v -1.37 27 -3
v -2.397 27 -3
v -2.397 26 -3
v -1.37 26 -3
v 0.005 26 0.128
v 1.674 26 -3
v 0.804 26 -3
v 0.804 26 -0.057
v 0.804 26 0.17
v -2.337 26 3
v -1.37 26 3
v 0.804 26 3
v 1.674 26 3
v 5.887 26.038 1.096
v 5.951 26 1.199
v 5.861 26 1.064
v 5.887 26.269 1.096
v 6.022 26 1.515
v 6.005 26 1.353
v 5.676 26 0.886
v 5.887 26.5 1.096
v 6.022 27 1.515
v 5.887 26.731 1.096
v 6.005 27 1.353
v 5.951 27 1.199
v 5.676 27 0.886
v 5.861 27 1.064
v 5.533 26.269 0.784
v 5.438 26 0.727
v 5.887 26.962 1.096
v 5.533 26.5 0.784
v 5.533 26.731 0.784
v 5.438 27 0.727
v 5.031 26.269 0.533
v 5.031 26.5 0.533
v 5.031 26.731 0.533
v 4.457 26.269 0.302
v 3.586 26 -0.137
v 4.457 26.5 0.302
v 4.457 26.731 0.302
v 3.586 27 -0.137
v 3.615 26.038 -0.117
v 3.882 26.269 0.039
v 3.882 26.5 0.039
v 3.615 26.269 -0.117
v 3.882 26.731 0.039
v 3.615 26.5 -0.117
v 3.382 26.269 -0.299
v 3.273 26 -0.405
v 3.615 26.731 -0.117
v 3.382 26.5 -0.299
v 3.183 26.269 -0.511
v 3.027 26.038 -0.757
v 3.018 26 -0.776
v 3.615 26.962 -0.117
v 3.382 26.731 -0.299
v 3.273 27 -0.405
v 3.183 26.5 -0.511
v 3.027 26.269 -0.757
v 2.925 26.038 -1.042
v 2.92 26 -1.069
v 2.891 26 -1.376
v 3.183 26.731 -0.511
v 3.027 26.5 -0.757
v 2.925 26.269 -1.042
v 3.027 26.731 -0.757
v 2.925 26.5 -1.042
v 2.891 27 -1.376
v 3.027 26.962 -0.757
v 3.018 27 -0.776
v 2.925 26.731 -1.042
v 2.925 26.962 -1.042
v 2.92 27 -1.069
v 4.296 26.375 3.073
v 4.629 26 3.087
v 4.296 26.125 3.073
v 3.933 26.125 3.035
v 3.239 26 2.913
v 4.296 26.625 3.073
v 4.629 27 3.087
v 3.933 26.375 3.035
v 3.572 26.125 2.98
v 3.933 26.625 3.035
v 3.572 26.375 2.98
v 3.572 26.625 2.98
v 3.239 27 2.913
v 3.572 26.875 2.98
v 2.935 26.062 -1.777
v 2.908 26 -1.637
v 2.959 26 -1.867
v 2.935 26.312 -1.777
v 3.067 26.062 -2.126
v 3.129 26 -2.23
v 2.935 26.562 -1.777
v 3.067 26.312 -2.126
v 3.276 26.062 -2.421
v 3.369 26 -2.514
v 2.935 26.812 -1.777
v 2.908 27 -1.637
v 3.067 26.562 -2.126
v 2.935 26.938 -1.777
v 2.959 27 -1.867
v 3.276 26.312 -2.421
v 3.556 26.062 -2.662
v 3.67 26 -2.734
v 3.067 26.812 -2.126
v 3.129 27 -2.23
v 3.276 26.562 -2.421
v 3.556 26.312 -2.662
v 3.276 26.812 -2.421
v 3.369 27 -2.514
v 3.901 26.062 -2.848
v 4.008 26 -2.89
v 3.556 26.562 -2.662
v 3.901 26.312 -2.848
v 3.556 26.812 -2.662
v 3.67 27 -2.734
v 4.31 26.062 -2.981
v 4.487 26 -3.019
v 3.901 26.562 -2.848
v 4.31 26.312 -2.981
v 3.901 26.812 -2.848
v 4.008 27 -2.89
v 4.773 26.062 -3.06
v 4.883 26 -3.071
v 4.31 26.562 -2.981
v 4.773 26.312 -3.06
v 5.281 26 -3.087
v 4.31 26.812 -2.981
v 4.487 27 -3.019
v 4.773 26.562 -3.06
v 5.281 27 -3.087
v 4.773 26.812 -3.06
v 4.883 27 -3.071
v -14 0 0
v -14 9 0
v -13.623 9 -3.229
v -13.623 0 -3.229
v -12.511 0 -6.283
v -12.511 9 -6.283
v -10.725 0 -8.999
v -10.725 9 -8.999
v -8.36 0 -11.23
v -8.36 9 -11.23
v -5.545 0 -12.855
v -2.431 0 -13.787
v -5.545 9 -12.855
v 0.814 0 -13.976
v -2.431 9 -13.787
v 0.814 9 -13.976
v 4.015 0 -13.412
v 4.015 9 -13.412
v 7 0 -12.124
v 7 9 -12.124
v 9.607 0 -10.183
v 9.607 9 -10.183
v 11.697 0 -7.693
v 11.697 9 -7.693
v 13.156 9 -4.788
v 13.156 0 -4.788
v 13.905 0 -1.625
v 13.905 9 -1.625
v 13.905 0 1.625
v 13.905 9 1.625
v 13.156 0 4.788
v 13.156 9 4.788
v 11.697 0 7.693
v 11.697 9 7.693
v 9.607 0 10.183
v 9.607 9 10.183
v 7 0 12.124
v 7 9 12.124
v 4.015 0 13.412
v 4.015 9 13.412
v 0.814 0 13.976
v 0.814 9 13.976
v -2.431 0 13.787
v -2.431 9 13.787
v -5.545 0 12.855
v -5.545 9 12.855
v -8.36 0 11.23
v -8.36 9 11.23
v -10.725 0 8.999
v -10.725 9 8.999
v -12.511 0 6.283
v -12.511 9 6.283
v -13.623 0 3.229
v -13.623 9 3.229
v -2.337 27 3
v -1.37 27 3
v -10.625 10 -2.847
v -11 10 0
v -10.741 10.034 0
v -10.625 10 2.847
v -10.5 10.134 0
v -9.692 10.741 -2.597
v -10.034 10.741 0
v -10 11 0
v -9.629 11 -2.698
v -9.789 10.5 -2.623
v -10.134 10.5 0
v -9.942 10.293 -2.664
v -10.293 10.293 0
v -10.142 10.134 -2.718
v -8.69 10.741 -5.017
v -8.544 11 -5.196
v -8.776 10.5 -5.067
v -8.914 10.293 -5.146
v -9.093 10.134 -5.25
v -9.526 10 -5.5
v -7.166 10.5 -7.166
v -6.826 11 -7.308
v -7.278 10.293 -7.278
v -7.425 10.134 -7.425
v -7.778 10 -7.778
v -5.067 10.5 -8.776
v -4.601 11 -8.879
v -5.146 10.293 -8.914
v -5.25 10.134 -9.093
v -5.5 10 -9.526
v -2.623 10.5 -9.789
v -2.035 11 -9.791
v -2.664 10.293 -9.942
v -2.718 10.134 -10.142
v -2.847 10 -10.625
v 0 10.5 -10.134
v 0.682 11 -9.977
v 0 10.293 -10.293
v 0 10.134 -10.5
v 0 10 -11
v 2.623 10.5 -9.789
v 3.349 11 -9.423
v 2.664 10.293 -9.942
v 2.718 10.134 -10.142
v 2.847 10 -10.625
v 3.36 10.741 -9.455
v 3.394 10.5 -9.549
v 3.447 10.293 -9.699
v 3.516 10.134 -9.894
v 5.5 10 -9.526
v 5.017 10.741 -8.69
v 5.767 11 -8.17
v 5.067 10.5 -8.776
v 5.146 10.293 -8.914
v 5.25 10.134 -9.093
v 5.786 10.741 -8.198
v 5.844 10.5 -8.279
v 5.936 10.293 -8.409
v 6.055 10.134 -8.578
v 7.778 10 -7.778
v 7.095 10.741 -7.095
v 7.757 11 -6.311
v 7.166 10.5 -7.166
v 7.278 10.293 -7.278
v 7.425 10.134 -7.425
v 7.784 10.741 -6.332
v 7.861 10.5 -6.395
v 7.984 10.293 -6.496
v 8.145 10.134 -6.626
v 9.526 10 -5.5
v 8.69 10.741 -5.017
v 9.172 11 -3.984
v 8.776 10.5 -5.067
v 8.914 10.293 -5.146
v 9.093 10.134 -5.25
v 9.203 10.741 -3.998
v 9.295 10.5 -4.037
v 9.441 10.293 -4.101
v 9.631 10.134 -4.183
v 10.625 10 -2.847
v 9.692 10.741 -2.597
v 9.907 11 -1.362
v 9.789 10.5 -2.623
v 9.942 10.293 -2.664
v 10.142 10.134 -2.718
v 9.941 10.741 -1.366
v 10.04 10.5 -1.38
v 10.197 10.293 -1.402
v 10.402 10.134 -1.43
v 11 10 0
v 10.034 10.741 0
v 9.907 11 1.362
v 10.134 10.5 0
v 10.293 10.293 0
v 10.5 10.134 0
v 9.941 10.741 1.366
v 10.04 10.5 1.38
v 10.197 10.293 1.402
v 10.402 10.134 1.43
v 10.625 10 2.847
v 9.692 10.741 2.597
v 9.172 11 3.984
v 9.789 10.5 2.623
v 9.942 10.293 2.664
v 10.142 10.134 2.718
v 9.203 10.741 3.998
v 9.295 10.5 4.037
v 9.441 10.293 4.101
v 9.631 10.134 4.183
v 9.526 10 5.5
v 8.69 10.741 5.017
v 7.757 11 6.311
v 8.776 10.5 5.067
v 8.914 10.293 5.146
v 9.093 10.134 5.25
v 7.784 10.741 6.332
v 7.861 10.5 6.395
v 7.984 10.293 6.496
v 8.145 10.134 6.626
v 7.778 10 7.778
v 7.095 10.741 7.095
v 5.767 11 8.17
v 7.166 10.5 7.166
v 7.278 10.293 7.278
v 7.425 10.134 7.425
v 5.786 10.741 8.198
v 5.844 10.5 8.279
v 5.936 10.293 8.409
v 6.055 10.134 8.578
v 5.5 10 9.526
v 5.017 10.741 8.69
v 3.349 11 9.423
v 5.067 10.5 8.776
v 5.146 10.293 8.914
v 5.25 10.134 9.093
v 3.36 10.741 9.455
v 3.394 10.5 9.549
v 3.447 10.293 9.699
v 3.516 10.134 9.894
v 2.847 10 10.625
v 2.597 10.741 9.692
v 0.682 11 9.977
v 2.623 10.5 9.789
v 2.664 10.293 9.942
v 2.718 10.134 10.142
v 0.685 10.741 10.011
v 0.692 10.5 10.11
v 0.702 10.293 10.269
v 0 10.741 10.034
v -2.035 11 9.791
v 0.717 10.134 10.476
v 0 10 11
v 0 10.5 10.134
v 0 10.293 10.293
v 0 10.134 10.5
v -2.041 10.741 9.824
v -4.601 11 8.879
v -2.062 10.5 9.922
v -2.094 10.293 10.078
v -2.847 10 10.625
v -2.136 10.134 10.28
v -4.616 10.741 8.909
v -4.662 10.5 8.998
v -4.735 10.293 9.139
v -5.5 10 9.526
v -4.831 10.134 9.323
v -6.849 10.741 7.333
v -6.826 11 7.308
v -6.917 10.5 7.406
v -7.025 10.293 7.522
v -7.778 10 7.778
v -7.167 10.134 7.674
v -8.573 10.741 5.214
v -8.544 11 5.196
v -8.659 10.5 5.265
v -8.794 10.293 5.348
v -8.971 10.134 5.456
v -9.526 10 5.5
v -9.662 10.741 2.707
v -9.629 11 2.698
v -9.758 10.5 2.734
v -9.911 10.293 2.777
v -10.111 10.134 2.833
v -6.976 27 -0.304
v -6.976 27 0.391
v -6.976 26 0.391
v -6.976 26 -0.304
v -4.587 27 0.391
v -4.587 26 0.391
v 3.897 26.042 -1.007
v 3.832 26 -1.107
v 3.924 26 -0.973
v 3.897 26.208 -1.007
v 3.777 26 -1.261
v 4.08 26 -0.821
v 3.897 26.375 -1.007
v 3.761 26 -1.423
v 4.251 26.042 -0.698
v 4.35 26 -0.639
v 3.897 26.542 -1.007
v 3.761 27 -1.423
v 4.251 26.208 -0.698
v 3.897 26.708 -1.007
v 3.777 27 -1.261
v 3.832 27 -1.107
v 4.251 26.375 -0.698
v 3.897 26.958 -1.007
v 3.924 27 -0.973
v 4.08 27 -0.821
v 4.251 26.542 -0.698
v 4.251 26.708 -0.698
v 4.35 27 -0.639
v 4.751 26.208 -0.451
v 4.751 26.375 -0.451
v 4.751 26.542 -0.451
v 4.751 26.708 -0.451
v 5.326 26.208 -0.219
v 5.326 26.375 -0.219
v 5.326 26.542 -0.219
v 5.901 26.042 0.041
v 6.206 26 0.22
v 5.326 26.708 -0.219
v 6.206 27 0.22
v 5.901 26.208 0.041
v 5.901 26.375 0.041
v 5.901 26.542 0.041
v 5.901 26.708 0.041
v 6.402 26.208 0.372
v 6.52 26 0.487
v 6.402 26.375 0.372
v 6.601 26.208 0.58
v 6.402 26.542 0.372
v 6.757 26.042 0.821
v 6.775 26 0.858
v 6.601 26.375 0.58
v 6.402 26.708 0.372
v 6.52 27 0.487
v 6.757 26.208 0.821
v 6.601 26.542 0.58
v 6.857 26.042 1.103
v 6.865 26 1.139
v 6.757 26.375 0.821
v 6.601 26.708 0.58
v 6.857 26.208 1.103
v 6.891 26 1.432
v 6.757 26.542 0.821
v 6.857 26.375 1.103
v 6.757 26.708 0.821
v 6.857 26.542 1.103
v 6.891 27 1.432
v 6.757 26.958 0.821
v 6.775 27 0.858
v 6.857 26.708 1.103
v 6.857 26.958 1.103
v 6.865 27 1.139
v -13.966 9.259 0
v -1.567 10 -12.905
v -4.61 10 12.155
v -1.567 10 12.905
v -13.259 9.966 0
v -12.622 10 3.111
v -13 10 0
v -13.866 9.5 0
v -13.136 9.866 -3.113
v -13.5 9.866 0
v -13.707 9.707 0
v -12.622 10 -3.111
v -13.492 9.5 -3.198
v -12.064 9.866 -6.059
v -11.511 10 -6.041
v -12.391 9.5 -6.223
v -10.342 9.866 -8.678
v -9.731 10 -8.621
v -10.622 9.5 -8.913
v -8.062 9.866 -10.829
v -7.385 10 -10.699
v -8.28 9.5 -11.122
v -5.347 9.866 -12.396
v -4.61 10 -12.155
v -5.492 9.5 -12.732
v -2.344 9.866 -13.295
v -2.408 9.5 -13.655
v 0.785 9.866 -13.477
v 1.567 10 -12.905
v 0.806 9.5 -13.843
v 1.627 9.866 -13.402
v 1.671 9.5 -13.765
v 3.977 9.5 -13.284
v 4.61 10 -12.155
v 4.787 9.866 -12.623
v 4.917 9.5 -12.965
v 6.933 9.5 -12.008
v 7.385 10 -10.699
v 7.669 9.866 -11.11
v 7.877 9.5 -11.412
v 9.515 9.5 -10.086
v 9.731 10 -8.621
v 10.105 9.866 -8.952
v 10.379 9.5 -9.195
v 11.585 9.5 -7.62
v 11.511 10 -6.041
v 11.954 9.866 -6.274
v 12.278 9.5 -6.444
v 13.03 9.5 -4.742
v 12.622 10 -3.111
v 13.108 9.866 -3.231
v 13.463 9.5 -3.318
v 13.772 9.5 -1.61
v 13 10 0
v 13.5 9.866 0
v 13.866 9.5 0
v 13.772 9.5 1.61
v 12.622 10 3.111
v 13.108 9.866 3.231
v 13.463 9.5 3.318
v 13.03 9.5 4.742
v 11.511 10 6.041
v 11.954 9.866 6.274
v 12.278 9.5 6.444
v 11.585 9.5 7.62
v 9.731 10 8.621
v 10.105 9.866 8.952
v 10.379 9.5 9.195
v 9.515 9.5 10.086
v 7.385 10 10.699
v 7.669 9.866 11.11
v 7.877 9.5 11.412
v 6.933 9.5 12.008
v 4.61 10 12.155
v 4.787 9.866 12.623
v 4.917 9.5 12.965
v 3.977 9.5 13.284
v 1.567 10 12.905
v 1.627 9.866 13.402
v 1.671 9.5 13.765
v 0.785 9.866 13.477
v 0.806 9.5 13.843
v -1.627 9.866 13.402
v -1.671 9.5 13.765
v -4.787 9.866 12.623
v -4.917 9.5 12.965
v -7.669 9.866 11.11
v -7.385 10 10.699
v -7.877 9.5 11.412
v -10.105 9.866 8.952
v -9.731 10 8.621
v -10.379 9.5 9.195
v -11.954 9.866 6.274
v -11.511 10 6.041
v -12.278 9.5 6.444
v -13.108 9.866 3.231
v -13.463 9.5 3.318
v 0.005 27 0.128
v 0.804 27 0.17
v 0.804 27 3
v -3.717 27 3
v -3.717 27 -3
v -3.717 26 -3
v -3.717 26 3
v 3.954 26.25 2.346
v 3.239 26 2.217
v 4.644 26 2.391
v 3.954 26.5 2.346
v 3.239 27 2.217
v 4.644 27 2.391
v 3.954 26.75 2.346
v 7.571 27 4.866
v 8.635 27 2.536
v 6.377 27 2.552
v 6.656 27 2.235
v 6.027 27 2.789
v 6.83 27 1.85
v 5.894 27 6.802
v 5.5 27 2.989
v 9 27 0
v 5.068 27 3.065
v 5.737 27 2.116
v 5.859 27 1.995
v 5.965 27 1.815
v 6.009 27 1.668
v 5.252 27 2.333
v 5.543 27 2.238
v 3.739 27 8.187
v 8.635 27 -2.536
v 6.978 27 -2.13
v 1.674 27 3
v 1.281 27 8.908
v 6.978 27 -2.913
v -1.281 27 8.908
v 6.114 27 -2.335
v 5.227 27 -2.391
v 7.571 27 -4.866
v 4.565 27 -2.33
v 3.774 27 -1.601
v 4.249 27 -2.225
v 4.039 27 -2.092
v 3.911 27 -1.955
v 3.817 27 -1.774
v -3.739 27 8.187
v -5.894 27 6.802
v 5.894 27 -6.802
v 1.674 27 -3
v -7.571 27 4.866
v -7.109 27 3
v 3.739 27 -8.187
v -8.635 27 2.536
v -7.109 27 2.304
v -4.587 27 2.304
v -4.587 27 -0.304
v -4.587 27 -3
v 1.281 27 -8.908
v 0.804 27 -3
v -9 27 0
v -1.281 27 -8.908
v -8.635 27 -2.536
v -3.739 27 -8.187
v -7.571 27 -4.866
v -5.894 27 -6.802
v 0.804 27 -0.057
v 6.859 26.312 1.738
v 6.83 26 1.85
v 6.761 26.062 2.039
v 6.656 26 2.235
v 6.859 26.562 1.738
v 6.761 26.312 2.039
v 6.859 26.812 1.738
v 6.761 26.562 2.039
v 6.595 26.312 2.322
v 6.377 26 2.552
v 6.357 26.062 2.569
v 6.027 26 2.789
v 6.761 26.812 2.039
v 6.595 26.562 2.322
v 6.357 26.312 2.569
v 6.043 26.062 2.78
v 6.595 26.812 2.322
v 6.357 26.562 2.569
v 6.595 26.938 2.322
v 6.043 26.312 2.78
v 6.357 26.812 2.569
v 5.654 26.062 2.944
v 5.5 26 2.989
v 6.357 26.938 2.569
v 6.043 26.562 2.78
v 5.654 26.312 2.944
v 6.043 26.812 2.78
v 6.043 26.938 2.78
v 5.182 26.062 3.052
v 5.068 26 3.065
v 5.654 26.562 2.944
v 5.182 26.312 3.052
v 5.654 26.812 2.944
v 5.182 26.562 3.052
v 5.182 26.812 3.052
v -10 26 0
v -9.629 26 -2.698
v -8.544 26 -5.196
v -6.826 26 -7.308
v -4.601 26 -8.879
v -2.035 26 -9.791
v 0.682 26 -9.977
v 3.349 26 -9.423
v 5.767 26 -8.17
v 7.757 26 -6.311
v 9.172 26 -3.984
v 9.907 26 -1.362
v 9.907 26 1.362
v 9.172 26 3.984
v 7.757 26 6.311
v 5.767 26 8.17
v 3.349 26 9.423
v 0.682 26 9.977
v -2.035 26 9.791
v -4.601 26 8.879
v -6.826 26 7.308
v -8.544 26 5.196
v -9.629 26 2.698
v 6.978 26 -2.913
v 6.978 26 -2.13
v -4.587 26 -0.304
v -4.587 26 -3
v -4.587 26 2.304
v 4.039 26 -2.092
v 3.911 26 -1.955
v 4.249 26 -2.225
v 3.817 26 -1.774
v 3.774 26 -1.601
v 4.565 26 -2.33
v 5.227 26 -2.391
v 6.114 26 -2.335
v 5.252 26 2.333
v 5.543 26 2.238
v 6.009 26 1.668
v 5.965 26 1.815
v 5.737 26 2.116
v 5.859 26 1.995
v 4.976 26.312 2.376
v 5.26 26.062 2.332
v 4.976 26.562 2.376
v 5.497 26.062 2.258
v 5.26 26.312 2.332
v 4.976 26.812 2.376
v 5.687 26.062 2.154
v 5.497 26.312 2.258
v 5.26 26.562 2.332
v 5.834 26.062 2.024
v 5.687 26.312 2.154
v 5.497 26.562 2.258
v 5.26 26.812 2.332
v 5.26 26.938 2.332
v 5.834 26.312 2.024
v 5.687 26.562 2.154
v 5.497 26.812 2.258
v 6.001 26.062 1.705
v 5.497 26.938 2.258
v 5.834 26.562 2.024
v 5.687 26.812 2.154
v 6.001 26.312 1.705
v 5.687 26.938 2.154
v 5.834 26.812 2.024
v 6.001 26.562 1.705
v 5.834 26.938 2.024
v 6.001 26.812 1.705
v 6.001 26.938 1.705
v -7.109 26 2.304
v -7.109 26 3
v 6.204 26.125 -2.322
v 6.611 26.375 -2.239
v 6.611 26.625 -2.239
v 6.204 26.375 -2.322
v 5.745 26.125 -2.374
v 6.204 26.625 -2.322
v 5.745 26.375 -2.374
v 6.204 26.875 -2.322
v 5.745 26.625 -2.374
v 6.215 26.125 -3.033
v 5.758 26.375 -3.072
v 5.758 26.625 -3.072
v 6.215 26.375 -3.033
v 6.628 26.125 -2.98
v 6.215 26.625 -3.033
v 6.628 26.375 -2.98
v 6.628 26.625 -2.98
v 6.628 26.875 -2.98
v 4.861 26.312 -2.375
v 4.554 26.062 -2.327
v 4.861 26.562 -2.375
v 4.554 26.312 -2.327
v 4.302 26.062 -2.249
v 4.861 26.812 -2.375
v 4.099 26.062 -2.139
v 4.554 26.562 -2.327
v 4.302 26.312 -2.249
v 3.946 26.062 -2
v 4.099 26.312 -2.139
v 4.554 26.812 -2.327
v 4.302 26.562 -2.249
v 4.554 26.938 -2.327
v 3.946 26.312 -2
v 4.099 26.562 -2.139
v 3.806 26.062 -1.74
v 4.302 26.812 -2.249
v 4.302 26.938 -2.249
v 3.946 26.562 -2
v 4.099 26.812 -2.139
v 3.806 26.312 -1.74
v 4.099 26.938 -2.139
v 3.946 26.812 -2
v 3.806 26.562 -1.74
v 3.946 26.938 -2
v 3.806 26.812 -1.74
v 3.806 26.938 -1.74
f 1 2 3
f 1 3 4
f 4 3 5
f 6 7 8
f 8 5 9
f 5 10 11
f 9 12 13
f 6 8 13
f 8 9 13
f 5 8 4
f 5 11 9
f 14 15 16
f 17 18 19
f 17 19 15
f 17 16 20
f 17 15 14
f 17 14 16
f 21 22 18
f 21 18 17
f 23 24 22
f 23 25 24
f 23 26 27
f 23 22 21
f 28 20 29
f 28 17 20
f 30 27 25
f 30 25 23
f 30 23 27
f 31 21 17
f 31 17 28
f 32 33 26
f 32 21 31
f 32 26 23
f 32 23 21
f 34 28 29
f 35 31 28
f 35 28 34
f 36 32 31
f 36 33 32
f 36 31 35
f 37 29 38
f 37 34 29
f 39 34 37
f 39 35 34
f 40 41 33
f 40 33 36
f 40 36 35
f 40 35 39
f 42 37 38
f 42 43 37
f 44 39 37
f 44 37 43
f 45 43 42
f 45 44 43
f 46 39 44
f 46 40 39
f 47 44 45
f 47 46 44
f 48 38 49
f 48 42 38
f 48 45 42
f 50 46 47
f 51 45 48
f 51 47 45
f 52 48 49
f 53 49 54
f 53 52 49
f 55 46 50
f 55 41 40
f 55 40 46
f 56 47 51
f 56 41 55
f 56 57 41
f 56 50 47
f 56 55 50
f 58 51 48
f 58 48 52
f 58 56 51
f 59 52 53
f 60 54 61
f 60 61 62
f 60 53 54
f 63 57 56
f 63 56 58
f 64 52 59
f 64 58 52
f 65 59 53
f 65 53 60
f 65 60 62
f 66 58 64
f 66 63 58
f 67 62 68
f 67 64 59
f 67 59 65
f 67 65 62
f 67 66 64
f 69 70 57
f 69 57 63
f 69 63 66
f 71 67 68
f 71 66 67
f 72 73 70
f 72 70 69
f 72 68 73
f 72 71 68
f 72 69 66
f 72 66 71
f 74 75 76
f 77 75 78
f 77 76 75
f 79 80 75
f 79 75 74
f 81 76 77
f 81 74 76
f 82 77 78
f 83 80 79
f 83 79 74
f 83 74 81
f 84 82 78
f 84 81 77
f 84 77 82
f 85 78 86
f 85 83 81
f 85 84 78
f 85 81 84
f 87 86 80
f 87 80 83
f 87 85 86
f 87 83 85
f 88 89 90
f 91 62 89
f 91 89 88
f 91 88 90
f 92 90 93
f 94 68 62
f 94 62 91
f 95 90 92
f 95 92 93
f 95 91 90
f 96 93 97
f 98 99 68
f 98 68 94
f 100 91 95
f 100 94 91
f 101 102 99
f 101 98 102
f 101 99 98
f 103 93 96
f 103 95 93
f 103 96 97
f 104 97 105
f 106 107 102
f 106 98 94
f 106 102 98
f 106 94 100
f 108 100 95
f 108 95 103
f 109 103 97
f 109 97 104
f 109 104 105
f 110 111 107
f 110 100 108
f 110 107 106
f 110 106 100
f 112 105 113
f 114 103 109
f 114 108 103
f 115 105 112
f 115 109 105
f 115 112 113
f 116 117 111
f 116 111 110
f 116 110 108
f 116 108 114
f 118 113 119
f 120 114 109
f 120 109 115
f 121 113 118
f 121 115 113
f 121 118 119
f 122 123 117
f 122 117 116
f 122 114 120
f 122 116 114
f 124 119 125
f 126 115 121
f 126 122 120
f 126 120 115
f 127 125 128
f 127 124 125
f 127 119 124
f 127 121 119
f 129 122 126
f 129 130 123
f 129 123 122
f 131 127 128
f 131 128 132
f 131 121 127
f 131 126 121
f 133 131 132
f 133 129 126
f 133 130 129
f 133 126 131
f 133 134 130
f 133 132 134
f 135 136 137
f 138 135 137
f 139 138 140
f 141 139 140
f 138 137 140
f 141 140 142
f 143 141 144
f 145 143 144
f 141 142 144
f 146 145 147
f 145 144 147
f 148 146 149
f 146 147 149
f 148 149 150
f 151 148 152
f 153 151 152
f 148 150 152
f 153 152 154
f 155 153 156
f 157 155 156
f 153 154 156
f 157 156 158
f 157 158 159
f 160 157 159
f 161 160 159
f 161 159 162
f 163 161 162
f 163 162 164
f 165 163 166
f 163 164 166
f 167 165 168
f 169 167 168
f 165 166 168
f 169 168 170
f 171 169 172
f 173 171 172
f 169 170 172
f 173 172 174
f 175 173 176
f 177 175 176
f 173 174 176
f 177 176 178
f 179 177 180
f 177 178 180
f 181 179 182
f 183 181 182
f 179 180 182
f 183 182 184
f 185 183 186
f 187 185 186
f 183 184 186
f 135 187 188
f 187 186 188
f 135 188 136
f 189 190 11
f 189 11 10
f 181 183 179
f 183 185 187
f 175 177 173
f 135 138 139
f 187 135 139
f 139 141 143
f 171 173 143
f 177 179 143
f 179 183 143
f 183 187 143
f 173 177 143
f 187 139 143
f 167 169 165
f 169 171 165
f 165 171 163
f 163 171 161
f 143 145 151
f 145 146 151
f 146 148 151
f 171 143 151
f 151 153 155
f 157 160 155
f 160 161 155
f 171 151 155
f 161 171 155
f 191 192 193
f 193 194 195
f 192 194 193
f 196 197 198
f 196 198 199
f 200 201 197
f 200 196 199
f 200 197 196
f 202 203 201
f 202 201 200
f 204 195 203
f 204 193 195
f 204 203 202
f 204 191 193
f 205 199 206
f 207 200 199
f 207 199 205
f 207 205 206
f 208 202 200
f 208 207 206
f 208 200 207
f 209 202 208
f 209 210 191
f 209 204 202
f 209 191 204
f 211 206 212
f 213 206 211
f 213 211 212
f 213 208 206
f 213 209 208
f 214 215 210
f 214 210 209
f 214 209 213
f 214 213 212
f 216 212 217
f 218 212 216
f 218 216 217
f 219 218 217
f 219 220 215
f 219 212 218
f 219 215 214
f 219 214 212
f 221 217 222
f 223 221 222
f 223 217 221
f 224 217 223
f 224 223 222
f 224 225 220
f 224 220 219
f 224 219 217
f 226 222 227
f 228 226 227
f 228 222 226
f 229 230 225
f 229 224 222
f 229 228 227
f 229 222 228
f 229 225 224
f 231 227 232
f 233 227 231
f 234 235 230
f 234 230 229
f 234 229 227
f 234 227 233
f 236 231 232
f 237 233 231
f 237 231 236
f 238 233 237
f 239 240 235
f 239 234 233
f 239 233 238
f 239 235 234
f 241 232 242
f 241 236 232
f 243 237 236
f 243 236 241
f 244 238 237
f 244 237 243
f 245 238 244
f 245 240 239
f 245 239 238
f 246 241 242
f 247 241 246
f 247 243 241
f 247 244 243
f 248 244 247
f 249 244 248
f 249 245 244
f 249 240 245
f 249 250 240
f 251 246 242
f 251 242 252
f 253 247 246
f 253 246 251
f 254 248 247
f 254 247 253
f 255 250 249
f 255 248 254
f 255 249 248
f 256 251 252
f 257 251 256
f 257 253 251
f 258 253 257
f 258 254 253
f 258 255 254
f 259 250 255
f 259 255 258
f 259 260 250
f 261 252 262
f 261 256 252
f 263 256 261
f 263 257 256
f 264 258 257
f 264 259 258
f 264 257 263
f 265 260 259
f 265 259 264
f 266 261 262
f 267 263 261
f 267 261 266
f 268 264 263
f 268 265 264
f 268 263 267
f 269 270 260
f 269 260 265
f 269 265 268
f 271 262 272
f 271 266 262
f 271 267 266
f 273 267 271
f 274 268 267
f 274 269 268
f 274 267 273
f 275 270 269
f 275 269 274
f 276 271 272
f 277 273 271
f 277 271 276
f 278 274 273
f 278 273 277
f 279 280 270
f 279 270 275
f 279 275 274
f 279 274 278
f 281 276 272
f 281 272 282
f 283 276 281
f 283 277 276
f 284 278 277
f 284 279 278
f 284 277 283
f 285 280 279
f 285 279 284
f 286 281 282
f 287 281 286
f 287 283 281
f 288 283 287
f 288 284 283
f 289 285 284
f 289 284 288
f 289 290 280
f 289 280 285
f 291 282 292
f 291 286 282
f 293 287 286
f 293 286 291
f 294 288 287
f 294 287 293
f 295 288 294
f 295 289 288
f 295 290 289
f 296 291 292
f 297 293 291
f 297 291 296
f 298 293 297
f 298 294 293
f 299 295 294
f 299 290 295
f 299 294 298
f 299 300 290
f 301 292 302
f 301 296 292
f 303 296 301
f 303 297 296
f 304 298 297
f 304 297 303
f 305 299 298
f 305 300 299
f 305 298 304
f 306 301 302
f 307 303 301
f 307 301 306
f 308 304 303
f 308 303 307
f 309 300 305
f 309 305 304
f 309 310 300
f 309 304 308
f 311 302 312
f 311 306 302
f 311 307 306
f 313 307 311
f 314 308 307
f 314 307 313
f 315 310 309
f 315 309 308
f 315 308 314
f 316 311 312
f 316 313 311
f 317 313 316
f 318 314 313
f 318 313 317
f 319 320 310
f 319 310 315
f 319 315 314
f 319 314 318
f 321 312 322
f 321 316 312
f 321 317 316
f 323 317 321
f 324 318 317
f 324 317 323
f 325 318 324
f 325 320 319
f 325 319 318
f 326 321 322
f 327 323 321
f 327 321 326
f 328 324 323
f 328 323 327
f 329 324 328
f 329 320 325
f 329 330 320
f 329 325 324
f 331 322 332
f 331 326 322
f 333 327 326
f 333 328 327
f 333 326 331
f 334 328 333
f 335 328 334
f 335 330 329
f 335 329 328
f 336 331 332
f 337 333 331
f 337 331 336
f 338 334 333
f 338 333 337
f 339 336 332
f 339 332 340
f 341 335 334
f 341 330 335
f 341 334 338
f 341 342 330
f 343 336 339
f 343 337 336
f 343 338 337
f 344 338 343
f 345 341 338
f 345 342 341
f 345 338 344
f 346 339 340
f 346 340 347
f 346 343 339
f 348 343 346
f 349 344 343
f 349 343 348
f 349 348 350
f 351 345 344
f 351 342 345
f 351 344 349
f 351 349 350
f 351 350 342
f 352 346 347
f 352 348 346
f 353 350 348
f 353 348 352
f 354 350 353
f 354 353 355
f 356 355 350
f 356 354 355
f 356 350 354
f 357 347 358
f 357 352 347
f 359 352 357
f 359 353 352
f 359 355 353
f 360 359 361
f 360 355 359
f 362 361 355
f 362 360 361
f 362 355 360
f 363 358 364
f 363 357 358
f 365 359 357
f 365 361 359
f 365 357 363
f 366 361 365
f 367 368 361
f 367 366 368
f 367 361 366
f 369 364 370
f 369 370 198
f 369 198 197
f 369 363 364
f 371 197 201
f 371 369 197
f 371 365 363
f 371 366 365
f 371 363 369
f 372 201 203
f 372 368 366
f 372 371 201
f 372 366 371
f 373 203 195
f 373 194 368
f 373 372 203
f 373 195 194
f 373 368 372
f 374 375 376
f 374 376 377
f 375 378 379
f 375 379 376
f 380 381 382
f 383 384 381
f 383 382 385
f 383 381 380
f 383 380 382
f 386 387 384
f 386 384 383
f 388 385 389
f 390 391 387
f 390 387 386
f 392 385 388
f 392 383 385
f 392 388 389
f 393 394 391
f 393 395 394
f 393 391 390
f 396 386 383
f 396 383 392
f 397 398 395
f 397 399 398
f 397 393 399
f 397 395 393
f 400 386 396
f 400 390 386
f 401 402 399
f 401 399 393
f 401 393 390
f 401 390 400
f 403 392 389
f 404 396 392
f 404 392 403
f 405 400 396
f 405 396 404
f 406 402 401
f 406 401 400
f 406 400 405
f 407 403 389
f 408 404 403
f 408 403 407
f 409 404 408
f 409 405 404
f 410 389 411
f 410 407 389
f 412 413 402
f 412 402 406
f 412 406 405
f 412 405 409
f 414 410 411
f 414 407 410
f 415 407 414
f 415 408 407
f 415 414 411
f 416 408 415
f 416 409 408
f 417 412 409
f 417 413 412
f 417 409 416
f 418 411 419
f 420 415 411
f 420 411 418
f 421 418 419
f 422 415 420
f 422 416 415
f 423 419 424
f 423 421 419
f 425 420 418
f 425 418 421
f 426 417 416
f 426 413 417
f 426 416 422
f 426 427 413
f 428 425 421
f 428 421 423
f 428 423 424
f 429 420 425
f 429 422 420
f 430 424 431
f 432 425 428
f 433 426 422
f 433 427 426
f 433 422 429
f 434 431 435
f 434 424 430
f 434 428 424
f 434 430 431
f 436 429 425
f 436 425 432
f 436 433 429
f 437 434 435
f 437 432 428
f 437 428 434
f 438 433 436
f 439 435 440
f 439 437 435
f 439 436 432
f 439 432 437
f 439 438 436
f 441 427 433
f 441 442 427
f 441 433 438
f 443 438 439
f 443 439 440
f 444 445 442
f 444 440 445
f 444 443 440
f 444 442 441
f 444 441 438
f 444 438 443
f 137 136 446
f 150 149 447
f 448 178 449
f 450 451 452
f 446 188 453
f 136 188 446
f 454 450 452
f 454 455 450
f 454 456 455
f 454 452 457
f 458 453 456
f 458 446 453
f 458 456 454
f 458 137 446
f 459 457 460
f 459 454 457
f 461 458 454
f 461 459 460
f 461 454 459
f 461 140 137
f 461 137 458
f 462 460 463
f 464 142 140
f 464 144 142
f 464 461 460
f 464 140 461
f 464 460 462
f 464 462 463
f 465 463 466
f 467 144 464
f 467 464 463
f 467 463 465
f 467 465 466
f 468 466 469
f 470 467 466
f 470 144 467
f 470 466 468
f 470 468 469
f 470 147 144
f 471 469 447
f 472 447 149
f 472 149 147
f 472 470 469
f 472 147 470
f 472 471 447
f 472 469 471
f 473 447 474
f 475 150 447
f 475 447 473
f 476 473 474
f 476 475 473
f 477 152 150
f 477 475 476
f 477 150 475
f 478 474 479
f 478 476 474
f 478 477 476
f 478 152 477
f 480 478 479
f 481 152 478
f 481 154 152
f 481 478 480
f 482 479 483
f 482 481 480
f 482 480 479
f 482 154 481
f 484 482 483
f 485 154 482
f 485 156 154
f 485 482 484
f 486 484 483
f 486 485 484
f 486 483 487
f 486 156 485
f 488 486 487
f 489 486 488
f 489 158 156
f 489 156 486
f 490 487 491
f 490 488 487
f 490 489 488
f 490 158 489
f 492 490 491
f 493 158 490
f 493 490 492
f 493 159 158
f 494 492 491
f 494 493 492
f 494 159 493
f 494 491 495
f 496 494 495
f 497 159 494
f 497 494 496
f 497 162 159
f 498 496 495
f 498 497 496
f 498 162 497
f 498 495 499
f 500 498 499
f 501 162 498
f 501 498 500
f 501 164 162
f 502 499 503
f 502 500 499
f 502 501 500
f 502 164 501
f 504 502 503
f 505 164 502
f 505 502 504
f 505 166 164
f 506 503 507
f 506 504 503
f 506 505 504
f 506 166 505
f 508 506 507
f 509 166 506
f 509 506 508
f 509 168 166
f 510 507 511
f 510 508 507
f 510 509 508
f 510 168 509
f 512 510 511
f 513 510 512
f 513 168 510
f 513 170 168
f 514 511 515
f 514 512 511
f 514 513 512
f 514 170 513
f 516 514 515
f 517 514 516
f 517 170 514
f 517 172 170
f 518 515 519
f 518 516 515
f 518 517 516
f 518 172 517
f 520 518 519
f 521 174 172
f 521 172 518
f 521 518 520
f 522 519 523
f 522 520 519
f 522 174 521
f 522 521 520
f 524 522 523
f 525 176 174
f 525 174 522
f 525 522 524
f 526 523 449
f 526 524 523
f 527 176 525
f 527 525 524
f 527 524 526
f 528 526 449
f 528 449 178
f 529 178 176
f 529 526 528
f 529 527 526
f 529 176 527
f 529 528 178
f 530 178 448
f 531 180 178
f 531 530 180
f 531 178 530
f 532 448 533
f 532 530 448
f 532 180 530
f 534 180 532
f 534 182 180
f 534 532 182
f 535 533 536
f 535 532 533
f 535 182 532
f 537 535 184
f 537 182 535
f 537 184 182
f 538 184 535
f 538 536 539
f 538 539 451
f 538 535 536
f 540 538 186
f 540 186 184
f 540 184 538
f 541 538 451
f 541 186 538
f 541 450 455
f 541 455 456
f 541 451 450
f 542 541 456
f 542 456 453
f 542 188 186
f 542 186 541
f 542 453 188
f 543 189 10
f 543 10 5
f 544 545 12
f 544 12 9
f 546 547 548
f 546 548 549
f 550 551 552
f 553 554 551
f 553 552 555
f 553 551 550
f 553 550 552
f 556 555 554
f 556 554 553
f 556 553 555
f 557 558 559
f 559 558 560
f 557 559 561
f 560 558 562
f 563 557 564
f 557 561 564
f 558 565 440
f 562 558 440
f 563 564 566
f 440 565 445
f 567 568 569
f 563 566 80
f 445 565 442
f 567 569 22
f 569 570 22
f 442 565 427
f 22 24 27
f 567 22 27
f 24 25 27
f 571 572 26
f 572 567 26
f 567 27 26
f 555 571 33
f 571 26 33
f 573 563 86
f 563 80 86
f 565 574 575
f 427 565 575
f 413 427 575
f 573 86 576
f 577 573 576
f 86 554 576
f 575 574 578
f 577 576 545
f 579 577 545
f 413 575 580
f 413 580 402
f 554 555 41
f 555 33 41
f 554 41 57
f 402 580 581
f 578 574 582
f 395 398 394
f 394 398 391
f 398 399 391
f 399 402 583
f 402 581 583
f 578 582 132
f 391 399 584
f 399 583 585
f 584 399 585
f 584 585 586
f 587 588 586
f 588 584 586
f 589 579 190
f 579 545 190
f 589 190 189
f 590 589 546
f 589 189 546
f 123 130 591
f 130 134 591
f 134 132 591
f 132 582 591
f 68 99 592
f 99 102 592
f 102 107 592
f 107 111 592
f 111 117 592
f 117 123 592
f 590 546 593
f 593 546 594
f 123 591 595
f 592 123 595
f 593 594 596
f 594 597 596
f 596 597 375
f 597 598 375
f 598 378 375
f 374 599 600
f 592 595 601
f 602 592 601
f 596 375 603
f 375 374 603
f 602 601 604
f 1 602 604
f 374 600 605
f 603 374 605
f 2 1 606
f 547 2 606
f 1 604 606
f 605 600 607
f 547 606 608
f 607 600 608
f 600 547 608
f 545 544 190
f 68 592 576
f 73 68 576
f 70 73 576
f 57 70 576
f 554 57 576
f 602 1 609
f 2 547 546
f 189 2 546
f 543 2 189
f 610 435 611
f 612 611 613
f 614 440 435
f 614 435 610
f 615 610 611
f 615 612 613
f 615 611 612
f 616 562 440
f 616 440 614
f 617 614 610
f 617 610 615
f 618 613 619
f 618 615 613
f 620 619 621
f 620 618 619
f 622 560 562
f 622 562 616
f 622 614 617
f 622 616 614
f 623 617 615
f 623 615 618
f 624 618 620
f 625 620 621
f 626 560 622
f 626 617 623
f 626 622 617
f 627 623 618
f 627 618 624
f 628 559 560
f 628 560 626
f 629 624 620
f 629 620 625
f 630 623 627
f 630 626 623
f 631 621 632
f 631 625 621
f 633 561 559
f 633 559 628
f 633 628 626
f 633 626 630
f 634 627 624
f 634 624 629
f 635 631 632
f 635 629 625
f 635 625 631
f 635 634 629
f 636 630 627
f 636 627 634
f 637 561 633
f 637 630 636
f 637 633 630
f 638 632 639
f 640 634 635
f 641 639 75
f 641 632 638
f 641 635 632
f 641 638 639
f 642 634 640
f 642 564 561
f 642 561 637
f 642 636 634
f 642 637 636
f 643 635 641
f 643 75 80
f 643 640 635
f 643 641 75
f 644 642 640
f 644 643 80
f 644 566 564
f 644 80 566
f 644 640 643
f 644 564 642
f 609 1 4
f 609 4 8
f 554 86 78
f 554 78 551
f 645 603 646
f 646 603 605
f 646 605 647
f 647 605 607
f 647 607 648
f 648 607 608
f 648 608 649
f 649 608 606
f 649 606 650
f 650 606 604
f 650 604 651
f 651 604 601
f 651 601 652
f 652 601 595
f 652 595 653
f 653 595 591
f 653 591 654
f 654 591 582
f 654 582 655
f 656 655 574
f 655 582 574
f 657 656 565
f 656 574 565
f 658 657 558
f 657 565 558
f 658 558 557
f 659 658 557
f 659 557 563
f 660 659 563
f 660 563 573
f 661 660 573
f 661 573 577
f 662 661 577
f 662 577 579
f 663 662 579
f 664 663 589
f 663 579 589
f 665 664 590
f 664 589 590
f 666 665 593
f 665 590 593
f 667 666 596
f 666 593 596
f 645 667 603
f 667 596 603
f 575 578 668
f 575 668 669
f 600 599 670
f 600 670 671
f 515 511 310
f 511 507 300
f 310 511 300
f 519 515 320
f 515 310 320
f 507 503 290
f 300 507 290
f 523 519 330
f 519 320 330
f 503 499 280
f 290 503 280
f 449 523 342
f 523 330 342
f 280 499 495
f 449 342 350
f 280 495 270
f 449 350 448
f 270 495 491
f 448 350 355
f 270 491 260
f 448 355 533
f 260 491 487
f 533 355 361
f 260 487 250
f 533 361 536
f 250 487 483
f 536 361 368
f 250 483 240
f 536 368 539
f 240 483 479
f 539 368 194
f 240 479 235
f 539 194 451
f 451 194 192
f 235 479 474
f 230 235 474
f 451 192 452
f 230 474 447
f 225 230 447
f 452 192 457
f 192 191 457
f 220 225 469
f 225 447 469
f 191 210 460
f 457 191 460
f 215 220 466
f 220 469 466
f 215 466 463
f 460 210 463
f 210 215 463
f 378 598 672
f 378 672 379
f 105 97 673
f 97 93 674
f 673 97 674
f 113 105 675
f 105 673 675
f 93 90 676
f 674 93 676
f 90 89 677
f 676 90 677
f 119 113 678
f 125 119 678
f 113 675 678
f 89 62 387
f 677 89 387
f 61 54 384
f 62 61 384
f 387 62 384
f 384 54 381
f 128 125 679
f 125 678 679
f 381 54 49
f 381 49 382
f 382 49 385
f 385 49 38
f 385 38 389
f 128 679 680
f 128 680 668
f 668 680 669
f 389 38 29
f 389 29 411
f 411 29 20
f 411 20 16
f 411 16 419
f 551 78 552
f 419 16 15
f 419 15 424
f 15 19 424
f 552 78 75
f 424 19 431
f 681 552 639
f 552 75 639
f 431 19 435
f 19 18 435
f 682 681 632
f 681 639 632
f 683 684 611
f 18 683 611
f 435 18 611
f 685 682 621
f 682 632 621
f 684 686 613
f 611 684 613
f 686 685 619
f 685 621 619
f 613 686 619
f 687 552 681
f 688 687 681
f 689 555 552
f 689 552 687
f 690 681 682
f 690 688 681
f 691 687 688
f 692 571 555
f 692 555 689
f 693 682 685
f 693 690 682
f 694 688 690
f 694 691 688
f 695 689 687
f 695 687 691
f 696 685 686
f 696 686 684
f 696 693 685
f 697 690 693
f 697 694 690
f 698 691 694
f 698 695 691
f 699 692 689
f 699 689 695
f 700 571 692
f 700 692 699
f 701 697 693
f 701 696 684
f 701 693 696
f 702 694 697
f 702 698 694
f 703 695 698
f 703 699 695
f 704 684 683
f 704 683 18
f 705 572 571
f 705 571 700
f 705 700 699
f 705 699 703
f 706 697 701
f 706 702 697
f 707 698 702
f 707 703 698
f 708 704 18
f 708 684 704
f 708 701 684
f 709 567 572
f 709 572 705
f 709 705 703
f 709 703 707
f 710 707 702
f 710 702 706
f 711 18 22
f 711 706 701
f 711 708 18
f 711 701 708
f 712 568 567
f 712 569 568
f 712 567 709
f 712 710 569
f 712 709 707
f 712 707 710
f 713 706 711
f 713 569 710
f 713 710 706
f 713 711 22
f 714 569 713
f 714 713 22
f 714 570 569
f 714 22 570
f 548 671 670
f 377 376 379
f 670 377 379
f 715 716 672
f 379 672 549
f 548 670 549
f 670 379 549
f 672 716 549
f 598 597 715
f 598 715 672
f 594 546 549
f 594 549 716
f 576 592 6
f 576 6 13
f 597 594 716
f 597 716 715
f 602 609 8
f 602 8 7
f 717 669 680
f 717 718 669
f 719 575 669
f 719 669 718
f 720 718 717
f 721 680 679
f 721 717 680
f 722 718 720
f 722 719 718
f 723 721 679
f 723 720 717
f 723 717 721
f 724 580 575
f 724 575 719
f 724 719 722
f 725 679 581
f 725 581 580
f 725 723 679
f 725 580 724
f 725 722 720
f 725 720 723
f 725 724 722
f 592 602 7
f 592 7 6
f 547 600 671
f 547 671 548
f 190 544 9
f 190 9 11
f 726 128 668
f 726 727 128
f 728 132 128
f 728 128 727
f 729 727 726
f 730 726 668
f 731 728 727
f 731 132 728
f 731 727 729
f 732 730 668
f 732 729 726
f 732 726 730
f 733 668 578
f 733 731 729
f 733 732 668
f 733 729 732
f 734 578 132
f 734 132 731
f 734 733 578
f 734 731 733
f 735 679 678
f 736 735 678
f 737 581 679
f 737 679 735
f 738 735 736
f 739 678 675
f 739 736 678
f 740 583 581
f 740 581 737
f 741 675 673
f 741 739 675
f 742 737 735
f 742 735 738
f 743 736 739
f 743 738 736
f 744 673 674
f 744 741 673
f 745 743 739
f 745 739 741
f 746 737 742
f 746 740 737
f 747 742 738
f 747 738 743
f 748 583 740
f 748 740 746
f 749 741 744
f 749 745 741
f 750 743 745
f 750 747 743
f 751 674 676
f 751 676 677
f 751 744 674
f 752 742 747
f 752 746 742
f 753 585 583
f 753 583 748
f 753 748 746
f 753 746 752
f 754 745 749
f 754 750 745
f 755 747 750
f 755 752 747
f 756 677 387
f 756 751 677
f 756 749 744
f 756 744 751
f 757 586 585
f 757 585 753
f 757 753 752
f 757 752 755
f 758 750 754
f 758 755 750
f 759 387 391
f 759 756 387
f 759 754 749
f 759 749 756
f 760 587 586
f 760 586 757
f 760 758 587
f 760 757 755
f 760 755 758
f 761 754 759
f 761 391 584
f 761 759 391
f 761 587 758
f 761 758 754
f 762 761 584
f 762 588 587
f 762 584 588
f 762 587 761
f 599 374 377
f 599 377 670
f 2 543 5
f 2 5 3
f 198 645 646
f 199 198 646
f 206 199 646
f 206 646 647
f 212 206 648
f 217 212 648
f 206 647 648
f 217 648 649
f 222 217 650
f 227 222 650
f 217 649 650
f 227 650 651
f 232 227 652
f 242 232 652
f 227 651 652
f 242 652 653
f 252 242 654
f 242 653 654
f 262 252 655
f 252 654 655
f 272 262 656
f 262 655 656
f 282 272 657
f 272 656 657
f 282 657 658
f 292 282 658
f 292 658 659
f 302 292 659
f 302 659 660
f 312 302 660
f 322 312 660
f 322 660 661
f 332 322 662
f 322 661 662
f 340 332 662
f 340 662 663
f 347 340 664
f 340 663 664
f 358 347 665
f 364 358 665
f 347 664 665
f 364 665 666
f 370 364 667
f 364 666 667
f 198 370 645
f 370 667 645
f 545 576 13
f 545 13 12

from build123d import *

# Parameters (mm, degrees)
CHAMFER1_SIZE      = 1
FILLET1_R          = 1
FILLET2_R          = 1
CUT_EXTRUDE1_DEPTH = 1


with BuildPart() as part:
    # Sketch1 → Revolve1 (revolve)
    with BuildSketch(Plane(origin=(0, 0, 0), x_dir=(0, 1, 0), z_dir=(0, 0, 1))):
        Polygon((0, 14), (10, 14), (10, 10), (27, 10), (27, 0), (0, 0), align=None)
    revolve(axis=Axis((0, 27, 0), (0, -1, 0)))

    # Chamfer1
    chamfer1_edges = [part.edges().sort_by_distance(p)[0] for p in [
        (10, 27, 0),
    ]]
    chamfer(chamfer1_edges, length=CHAMFER1_SIZE)

    # Fillet1
    fillet1_edges = [part.edges().sort_by_distance(p)[0] for p in [
        (10, 10, 0),
    ]]
    fillet(fillet1_edges, radius=FILLET1_R)

    # Fillet2
    fillet2_edges = [part.edges().sort_by_distance(p)[0] for p in [
        (14, 10, 0),
    ]]
    fillet(fillet2_edges, radius=FILLET2_R)

    # Sketch2 → Cut-Extrude1 (cut)
    with BuildSketch(Plane(origin=(0, 27, 0), x_dir=(-1, 0, 0), z_dir=(0, 1, 0))):
        with BuildLine():
            add(Edge.make_bspline(
                [(-2.891304348, -1.376358696), (-2.893256975, -1.445784768), (-2.89704504, -1.580470179), (-2.930373434, -1.776453017), (-2.985954677, -1.958491369), (-3.06233216, -2.127831325), (-3.160586384, -2.281397406), (-3.272814945, -2.424730968), (-3.406825247, -2.550807782), (-3.555286262, -2.665606611), (-3.720516873, -2.766637543), (-3.902939881, -2.851664305), (-4.1000545, -2.925119751), (-4.312408375, -2.984347065), (-4.538102751, -3.030388297), (-4.776023597, -3.062017105), (-5.024975551, -3.08336435), (-5.19470001, -3.08574336), (-5.28125, -3.086956522)],
                knots=[0, 0, 0, 0, 1.005643061, 1.95093061, 2.870738502, 3.757832008, 4.633806625, 5.507195241, 6.389247641, 7.292512577, 8.223494331, 9.189475669, 10.205094408, 11.269007441, 12.381228937, 13.540657028, 14.745872513, 16, 16, 16, 16], degree=3))
            add(Edge.make_bspline(
                [(-5.28125, -3.086956522), (-5.360971004, -3.086063288), (-5.520031312, -3.084281097), (-5.75656703, -3.073355487), (-5.987975241, -3.055306767), (-6.21079801, -3.033603304), (-6.423346627, -3.009477077), (-6.622805279, -2.981574567), (-6.806658039, -2.949130506), (-6.923064215, -2.924650998), (-6.97826087, -2.913043478)],
                knots=[0, 0, 0, 0, 1.119729043, 2.234096861, 3.324996266, 4.379512959, 5.378439906, 6.329323539, 7.207810484, 8, 8, 8, 8], degree=3))
            Line((-6.97826087, -2.913043478), (-6.97826087, -2.130434783))
            add(Edge.make_bspline(
                [(-6.97826087, -2.130434783), (-6.919165793, -2.150682551), (-6.798419665, -2.192053842), (-6.609018112, -2.240578611), (-6.41034209, -2.286150871), (-6.20050371, -2.324223656), (-5.977458635, -2.354188802), (-5.74035588, -2.375262926), (-5.488398941, -2.389534151), (-5.315691279, -2.390703292), (-5.226902174, -2.391304348)],
                knots=[0, 0, 0, 0, 0.842364813, 1.72116351, 2.635659137, 3.591954833, 4.596841017, 5.670471508, 6.802388115, 8, 8, 8, 8], degree=3))
            add(Edge.make_bspline(
                [(-5.226902174, -2.391304348), (-5.163466632, -2.390651338), (-5.041451136, -2.389395301), (-4.865633018, -2.376263738), (-4.704182749, -2.3591435), (-4.557448129, -2.32940707), (-4.423956498, -2.295180195), (-4.303296886, -2.251625304), (-4.19565966, -2.199792452), (-4.099167106, -2.141685494), (-4.01647088, -2.074548109), (-3.943968157, -2.002194202), (-3.885784495, -1.921479924), (-3.838521468, -1.83432077), (-3.803582408, -1.740421984), (-3.779319418, -1.640031503), (-3.764056478, -1.533525867), (-3.761950623, -1.46019787), (-3.760869565, -1.422554348)],
                knots=[0, 0, 0, 0, 1.523194236, 2.929797672, 4.233142745, 5.41923506, 6.522104548, 7.540643951, 8.494207191, 9.387815665, 10.238903194, 11.04655015, 11.840679357, 12.619387111, 13.4214478, 14.239285369, 15.096122854, 16, 16, 16, 16], degree=3))
            add(Edge.make_bspline(
                [(-3.760869565, -1.422554348), (-3.762218701, -1.383440778), (-3.764854628, -1.307021088), (-3.791778823, -1.197385593), (-3.833874612, -1.095715968), (-3.895589177, -1.005041856), (-3.968114472, -0.919845819), (-4.053315168, -0.841779159), (-4.147364807, -0.766290328), (-4.290070482, -0.671359764), (-4.489755312, -0.559812554), (-4.755758112, -0.448263589), (-5.037837792, -0.336261682), (-5.327327353, -0.219443132), (-5.616743105, -0.095439779), (-5.900671358, 0.035928527), (-6.166963577, 0.186635246), (-6.367486356, 0.3361767), (-6.50758604, 0.470833926), (-6.602897854, 0.578652807), (-6.684679481, 0.696390124), (-6.760227351, 0.81988187), (-6.819332991, 0.95635363), (-6.860340608, 1.104522993), (-6.887554703, 1.264408532), (-6.890025412, 1.374880549), (-6.891304348, 1.432065217)],
                knots=[0, 0, 0, 0, 0.619815692, 1.2109895, 1.781199776, 2.357496674, 2.943929778, 3.554333405, 4.188738872, 4.856760597, 6.272963823, 7.811824644, 9.431291666, 11.092170587, 12.76691914, 14.429617761, 16.056218893, 17.616396577, 18.384212937, 19.138341755, 19.896401647, 20.65718422, 21.4332038, 22.247956952, 23.09307348, 24, 24, 24, 24], degree=3))
            add(Edge.make_bspline(
                [(-6.891304348, 1.432065217), (-6.889745465, 1.483341333), (-6.886623871, 1.586019546), (-6.860837557, 1.739445048), (-6.820282244, 1.891529982), (-6.763187009, 2.041721189), (-6.688399481, 2.186542657), (-6.59738111, 2.325382168), (-6.485582972, 2.453213148), (-6.357387336, 2.573747467), (-6.209075999, 2.684028027), (-6.042502613, 2.784628777), (-5.85495723, 2.870963409), (-5.650029948, 2.949309849), (-5.423589443, 3.011500607), (-5.17675842, 3.056055567), (-4.909488573, 3.08120208), (-4.72469023, 3.084994391), (-4.629076087, 3.086956522)],
                knots=[0, 0, 0, 0, 0.784067079, 1.570060577, 2.373452904, 3.189297991, 4.022898002, 4.862695015, 5.722463422, 6.614650011, 7.550049647, 8.544652583, 9.586108202, 10.704431291, 11.897970904, 13.172772987, 14.537200697, 16, 16, 16, 16], degree=3))
            add(Edge.make_bspline(
                [(-4.629076087, 3.086956522), (-4.575613848, 3.086610144), (-4.464505975, 3.085890284), (-4.293308173, 3.073583281), (-4.114746578, 3.058061805), (-3.933177649, 3.035827154), (-3.751912041, 3.010443569), (-3.57395579, 2.980516606), (-3.403125456, 2.948575486), (-3.292522299, 2.924611635), (-3.239130435, 2.913043478)],
                knots=[0, 0, 0, 0, 0.91416123, 1.89985515, 2.934260182, 3.979599391, 5.027947684, 6.064525625, 7.065681407, 8, 8, 8, 8], degree=3))
            Line((-3.239130435, 2.913043478), (-3.239130435, 2.217391304))
            add(Edge.make_bspline(
                [(-3.239130435, 2.217391304), (-3.357971402, 2.243749443), (-3.594474622, 2.29620429), (-3.950412242, 2.348530566), (-4.299963453, 2.385175658), (-4.530706874, 2.389285877), (-4.644021739, 2.391304348)],
                knots=[0, 0, 0, 0, 1.029411825, 2.048613503, 3.041701399, 4, 4, 4, 4], degree=3))
            add(Edge.make_bspline(
                [(-4.644021739, 2.391304348), (-4.701101178, 2.390431872), (-4.811743494, 2.388740672), (-4.971923163, 2.378342646), (-5.120237405, 2.359301917), (-5.256836907, 2.3335494), (-5.382099169, 2.301680277), (-5.495638683, 2.261191945), (-5.596829934, 2.211770598), (-5.6873755, 2.15624259), (-5.765945999, 2.093381994), (-5.835015926, 2.026647347), (-5.892681803, 1.954080686), (-5.939230398, 1.875694945), (-5.97565839, 1.792532309), (-6.003949196, 1.70494053), (-6.018307856, 1.61143275), (-6.020578052, 1.547595053), (-6.02173913, 1.514945652)],
                knots=[0, 0, 0, 0, 1.491437277, 2.890989782, 4.191431573, 5.395946596, 6.521058188, 7.565423013, 8.539223212, 9.458660202, 10.334655275, 11.163081303, 11.963306063, 12.748694206, 13.538083787, 14.331542868, 15.146677777, 16, 16, 16, 16], degree=3))
            add(Edge.make_bspline(
                [(-6.02173913, 1.514945652), (-6.020391512, 1.475835905), (-6.017758549, 1.399423684), (-5.990712947, 1.289326834), (-5.948392096, 1.187371322), (-5.889221823, 1.093867016), (-5.813847439, 1.010530917), (-5.730887666, 0.929467142), (-5.636504976, 0.853417269), (-5.494079004, 0.756044238), (-5.292632358, 0.645078177), (-5.027933357, 0.528654214), (-4.744289363, 0.419843921), (-4.455483254, 0.301879764), (-4.165028382, 0.179166441), (-3.928307462, 0.065008), (-3.744588107, -0.032987708), (-3.61583947, -0.115137783), (-3.493592228, -0.201779371), (-3.381185761, -0.297499604), (-3.27569995, -0.398738791), (-3.181404108, -0.510019231), (-3.097288568, -0.628917616), (-3.02475958, -0.756630047), (-2.962723179, -0.893416032), (-2.922268905, -1.043906372), (-2.895043236, -1.205985193), (-2.892579233, -1.318264769), (-2.891304348, -1.376358696)],
                knots=[0, 0, 0, 0, 0.667485538, 1.304126353, 1.925325377, 2.548259058, 3.18485279, 3.841928735, 4.529978862, 5.253739616, 6.789399884, 8.452896455, 10.194043647, 11.982660287, 13.786213269, 15.583473082, 16.473910229, 17.343881083, 18.192645259, 19.033319022, 19.865571682, 20.689426309, 21.522902605, 22.351690537, 23.197589349, 24.082454772, 25.007853999, 26, 26, 26, 26], degree=3))
        make_face()
        Polygon((2.39673913, -3), (1.369565217, -3), (-0.804347826, -0.057065217), (-0.804347826, -3), (-1.673913043, -3), (-1.673913043, 3), (-0.804347826, 3), (-0.804347826, 0.169836957), (1.369565217, 3), (2.336956522, 3), (-0.005434783, 0.127717391), align=None)
        Polygon((7.108695652, 2.304347826), (4.586956522, 2.304347826), (4.586956522, 0.391304348), (6.975543478, 0.391304348), (6.975543478, -0.304347826), (4.586956522, -0.304347826), (4.586956522, -3), (3.717391304, -3), (3.717391304, 3), (7.108695652, 3), align=None)
    extrude(amount=-CUT_EXTRUDE1_DEPTH, mode=Mode.SUBTRACT)


solid = part.part
